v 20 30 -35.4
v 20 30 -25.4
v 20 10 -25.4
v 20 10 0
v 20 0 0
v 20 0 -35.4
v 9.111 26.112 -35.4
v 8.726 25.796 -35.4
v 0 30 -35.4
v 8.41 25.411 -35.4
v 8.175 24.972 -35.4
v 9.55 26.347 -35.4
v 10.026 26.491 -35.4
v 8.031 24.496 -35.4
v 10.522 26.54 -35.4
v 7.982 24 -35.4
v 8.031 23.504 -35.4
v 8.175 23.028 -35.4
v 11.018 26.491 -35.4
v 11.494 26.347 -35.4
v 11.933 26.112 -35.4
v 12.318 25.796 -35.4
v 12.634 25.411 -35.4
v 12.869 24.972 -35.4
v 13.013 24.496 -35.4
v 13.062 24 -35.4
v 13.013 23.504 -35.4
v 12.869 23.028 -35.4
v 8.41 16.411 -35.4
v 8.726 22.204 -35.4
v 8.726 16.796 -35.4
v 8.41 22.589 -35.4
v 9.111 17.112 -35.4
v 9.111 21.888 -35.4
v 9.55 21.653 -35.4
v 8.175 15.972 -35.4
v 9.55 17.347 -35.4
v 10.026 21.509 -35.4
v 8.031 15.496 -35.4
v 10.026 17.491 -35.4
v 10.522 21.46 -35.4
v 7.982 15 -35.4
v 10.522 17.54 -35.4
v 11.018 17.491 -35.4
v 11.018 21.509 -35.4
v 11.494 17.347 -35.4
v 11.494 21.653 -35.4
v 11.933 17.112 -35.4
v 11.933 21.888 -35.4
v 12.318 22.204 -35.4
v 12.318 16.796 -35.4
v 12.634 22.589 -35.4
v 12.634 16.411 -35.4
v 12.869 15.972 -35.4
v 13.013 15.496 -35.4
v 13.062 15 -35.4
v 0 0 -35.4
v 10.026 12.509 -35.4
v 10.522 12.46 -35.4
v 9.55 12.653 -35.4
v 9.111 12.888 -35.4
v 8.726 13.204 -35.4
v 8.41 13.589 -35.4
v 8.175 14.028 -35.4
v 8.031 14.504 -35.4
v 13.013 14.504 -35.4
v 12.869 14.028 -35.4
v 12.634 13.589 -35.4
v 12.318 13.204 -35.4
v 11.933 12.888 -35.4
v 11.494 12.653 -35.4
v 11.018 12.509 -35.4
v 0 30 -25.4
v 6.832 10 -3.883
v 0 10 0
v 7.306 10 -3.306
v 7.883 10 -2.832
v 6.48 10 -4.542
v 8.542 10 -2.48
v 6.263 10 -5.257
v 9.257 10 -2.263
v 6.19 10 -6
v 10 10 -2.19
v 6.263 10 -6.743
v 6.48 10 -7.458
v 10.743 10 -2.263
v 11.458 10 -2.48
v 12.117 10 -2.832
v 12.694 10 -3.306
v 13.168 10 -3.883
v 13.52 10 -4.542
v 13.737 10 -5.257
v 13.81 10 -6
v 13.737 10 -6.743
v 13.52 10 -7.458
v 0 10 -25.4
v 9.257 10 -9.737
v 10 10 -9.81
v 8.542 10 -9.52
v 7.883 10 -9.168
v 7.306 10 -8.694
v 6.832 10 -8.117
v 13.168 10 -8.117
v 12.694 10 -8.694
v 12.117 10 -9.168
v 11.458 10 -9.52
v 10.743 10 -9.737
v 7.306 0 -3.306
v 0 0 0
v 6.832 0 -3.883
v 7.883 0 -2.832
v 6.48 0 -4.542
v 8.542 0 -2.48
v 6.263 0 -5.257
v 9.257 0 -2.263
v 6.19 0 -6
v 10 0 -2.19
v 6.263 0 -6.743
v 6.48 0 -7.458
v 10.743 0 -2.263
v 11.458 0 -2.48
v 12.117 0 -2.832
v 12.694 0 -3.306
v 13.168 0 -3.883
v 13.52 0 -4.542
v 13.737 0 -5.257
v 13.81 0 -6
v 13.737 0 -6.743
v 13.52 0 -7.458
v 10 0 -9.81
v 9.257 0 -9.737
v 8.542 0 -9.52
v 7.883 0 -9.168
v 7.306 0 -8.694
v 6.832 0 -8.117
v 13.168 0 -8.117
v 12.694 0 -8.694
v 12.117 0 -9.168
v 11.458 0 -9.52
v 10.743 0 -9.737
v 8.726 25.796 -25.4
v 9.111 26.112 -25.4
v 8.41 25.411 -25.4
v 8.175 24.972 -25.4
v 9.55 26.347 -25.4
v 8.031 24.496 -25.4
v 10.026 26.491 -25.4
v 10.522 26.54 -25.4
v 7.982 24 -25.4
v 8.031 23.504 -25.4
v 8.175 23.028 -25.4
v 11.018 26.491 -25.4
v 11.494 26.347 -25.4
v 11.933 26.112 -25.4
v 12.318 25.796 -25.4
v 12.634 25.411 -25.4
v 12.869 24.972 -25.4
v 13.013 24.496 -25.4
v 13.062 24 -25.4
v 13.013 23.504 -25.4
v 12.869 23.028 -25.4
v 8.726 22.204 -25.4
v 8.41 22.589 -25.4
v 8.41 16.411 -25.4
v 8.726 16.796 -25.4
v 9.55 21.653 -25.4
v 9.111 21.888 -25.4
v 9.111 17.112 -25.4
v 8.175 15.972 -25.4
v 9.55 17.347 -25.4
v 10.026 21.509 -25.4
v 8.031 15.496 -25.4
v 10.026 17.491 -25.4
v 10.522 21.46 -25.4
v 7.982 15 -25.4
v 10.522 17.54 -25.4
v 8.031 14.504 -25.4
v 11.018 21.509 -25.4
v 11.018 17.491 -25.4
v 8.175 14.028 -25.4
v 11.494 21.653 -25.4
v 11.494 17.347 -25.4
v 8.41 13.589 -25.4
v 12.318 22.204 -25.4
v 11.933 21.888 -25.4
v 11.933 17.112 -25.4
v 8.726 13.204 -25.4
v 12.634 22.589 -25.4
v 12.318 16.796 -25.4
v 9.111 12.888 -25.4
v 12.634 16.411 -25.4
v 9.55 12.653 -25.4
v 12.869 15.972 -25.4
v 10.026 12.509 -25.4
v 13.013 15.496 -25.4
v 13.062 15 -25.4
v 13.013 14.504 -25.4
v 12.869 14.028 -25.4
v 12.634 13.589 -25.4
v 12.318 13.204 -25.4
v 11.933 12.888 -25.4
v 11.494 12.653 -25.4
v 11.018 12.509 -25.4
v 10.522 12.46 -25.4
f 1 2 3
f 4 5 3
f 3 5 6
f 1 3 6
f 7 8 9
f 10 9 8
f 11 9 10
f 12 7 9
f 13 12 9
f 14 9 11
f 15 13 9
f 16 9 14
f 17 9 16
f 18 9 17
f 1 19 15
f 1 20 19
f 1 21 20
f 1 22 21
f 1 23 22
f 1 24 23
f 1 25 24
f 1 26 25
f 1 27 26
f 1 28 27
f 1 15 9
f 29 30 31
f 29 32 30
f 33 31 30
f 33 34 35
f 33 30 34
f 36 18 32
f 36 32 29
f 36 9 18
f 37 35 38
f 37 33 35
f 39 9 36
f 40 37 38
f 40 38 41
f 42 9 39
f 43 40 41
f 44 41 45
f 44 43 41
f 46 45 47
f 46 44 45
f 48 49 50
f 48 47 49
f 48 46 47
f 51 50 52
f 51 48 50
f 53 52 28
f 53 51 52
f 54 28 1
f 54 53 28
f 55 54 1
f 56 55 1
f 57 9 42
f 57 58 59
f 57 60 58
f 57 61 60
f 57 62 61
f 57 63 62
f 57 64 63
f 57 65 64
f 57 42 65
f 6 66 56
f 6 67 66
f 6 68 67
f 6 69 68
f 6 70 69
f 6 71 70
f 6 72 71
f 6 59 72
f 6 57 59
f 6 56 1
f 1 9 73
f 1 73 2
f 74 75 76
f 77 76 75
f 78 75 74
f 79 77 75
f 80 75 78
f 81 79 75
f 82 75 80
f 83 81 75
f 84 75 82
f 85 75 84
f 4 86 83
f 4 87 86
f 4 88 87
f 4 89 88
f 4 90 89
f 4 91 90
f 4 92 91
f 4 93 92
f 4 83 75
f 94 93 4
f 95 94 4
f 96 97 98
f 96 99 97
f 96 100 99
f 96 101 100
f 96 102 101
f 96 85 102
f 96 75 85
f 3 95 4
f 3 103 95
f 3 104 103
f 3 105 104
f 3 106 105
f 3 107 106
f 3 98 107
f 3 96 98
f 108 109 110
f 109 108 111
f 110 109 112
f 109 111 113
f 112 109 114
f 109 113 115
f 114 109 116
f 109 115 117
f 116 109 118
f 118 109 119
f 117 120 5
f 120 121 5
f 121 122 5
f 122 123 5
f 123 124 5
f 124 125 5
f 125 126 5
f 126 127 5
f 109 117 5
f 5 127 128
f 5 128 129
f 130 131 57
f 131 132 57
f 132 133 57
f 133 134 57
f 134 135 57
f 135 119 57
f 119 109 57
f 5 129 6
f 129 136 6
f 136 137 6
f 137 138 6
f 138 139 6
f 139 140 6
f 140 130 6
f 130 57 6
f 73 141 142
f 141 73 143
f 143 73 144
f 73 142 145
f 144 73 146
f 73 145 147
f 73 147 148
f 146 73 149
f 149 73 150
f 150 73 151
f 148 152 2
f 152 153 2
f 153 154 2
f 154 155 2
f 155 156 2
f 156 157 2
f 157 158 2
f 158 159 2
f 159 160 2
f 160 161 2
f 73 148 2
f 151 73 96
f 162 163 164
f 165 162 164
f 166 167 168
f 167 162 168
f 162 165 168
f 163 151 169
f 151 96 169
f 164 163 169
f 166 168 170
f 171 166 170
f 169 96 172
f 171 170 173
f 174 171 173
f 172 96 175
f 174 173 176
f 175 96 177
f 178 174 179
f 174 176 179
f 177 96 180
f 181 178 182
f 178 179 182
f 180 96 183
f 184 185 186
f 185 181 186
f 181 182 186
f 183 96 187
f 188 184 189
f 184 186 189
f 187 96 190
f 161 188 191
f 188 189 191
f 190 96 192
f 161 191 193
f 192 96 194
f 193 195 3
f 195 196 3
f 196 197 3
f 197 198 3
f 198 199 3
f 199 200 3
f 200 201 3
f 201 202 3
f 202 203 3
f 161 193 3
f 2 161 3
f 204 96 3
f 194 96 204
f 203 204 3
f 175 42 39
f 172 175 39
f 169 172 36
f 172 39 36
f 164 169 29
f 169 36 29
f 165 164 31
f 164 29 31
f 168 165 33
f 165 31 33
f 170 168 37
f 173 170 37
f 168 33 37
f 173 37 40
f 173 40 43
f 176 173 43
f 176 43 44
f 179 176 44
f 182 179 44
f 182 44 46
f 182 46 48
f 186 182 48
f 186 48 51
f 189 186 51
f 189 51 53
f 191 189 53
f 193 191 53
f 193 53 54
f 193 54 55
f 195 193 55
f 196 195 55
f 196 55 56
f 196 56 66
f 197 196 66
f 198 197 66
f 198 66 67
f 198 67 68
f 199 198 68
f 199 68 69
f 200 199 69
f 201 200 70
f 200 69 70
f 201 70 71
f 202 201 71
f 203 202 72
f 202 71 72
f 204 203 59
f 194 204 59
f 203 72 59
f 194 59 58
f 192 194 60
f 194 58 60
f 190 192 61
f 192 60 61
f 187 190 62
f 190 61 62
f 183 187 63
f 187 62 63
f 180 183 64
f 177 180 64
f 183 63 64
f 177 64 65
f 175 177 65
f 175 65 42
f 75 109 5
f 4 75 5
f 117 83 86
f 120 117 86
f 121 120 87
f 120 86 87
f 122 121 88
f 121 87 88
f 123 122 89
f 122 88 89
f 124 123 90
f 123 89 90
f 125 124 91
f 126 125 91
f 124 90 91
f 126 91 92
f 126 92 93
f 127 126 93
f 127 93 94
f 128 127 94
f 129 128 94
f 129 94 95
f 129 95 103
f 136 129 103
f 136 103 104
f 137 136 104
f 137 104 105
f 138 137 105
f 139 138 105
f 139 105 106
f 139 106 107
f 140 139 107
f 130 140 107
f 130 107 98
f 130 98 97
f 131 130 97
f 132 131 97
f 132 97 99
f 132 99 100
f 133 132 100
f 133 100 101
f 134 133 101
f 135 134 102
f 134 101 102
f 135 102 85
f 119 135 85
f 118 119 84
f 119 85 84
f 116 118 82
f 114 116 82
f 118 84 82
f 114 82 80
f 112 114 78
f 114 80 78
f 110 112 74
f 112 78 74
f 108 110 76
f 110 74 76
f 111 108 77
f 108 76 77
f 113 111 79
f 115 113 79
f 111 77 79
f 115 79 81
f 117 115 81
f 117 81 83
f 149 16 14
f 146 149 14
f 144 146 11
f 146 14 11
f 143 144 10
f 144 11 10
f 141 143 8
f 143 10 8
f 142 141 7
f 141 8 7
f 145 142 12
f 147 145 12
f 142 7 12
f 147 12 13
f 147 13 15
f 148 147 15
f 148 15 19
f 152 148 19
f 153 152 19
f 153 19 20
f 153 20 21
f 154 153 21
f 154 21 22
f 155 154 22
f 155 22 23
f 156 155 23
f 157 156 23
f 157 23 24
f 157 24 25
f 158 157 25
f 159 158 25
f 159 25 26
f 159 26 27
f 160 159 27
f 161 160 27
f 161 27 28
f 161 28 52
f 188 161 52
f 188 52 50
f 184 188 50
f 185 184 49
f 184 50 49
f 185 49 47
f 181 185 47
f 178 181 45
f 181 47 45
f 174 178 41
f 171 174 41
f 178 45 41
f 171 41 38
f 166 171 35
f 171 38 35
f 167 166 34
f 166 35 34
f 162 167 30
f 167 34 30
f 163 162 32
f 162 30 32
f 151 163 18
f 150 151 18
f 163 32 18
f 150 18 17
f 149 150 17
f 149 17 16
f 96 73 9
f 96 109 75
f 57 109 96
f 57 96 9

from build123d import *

# Parameters (mm, degrees)
SKETCH1_W           = 20
SKETCH1_H           = 25.4
BOSS_EXTRUDE1_DEPTH = 10
SKETCH2_W           = 20
SKETCH2_H           = 10
BOSS_EXTRUDE2_DEPTH = 30
SKETCH3_R           = 3.81
CUT_EXTRUDE1_DEPTH  = 30
SKETCH4_R           = 2.54
CUT_EXTRUDE2_DEPTH  = 30


with BuildPart() as part:
    # Sketch1 → Boss-Extrude1 (new body)
    with BuildSketch(Plane(origin=(0, 0, 0), x_dir=(1, 0, 0), z_dir=(0, 1, 0))):
        with Locations((10, 12.7)):
            Rectangle(SKETCH1_W, SKETCH1_H)
    extrude(amount=BOSS_EXTRUDE1_DEPTH)

    # Sketch2 → Boss-Extrude2 (add)
    with BuildSketch(Plane(origin=(0, 0, 0), x_dir=(1, 0, 0), z_dir=(0, 1, 0))):
        with Locations((10, 30.4)):
            Rectangle(SKETCH2_W, SKETCH2_H)
    extrude(amount=BOSS_EXTRUDE2_DEPTH)

    # Sketch3 → Cut-Extrude1 (cut)
    with BuildSketch(Plane(origin=(0, 10, 0), x_dir=(1, 0, 0), z_dir=(0, 1, 0))):
        with Locations(Location((10, 6, 0), (0, 0, 270))):
            Circle(SKETCH3_R)
    extrude(amount=-CUT_EXTRUDE1_DEPTH, mode=Mode.SUBTRACT)

    # Sketch4 → Cut-Extrude2 (cut)
    with BuildSketch(Plane(origin=(0, 0, -35.4), x_dir=(-1, 0, 0), z_dir=(0, 0, -1))):
        with Locations((-10.522018302, 24)):
            Circle(SKETCH4_R)
        with Locations((-10.522018302, 15)):
            Circle(SKETCH4_R)
    extrude(amount=-CUT_EXTRUDE2_DEPTH, mode=Mode.SUBTRACT)


solid = part.part
